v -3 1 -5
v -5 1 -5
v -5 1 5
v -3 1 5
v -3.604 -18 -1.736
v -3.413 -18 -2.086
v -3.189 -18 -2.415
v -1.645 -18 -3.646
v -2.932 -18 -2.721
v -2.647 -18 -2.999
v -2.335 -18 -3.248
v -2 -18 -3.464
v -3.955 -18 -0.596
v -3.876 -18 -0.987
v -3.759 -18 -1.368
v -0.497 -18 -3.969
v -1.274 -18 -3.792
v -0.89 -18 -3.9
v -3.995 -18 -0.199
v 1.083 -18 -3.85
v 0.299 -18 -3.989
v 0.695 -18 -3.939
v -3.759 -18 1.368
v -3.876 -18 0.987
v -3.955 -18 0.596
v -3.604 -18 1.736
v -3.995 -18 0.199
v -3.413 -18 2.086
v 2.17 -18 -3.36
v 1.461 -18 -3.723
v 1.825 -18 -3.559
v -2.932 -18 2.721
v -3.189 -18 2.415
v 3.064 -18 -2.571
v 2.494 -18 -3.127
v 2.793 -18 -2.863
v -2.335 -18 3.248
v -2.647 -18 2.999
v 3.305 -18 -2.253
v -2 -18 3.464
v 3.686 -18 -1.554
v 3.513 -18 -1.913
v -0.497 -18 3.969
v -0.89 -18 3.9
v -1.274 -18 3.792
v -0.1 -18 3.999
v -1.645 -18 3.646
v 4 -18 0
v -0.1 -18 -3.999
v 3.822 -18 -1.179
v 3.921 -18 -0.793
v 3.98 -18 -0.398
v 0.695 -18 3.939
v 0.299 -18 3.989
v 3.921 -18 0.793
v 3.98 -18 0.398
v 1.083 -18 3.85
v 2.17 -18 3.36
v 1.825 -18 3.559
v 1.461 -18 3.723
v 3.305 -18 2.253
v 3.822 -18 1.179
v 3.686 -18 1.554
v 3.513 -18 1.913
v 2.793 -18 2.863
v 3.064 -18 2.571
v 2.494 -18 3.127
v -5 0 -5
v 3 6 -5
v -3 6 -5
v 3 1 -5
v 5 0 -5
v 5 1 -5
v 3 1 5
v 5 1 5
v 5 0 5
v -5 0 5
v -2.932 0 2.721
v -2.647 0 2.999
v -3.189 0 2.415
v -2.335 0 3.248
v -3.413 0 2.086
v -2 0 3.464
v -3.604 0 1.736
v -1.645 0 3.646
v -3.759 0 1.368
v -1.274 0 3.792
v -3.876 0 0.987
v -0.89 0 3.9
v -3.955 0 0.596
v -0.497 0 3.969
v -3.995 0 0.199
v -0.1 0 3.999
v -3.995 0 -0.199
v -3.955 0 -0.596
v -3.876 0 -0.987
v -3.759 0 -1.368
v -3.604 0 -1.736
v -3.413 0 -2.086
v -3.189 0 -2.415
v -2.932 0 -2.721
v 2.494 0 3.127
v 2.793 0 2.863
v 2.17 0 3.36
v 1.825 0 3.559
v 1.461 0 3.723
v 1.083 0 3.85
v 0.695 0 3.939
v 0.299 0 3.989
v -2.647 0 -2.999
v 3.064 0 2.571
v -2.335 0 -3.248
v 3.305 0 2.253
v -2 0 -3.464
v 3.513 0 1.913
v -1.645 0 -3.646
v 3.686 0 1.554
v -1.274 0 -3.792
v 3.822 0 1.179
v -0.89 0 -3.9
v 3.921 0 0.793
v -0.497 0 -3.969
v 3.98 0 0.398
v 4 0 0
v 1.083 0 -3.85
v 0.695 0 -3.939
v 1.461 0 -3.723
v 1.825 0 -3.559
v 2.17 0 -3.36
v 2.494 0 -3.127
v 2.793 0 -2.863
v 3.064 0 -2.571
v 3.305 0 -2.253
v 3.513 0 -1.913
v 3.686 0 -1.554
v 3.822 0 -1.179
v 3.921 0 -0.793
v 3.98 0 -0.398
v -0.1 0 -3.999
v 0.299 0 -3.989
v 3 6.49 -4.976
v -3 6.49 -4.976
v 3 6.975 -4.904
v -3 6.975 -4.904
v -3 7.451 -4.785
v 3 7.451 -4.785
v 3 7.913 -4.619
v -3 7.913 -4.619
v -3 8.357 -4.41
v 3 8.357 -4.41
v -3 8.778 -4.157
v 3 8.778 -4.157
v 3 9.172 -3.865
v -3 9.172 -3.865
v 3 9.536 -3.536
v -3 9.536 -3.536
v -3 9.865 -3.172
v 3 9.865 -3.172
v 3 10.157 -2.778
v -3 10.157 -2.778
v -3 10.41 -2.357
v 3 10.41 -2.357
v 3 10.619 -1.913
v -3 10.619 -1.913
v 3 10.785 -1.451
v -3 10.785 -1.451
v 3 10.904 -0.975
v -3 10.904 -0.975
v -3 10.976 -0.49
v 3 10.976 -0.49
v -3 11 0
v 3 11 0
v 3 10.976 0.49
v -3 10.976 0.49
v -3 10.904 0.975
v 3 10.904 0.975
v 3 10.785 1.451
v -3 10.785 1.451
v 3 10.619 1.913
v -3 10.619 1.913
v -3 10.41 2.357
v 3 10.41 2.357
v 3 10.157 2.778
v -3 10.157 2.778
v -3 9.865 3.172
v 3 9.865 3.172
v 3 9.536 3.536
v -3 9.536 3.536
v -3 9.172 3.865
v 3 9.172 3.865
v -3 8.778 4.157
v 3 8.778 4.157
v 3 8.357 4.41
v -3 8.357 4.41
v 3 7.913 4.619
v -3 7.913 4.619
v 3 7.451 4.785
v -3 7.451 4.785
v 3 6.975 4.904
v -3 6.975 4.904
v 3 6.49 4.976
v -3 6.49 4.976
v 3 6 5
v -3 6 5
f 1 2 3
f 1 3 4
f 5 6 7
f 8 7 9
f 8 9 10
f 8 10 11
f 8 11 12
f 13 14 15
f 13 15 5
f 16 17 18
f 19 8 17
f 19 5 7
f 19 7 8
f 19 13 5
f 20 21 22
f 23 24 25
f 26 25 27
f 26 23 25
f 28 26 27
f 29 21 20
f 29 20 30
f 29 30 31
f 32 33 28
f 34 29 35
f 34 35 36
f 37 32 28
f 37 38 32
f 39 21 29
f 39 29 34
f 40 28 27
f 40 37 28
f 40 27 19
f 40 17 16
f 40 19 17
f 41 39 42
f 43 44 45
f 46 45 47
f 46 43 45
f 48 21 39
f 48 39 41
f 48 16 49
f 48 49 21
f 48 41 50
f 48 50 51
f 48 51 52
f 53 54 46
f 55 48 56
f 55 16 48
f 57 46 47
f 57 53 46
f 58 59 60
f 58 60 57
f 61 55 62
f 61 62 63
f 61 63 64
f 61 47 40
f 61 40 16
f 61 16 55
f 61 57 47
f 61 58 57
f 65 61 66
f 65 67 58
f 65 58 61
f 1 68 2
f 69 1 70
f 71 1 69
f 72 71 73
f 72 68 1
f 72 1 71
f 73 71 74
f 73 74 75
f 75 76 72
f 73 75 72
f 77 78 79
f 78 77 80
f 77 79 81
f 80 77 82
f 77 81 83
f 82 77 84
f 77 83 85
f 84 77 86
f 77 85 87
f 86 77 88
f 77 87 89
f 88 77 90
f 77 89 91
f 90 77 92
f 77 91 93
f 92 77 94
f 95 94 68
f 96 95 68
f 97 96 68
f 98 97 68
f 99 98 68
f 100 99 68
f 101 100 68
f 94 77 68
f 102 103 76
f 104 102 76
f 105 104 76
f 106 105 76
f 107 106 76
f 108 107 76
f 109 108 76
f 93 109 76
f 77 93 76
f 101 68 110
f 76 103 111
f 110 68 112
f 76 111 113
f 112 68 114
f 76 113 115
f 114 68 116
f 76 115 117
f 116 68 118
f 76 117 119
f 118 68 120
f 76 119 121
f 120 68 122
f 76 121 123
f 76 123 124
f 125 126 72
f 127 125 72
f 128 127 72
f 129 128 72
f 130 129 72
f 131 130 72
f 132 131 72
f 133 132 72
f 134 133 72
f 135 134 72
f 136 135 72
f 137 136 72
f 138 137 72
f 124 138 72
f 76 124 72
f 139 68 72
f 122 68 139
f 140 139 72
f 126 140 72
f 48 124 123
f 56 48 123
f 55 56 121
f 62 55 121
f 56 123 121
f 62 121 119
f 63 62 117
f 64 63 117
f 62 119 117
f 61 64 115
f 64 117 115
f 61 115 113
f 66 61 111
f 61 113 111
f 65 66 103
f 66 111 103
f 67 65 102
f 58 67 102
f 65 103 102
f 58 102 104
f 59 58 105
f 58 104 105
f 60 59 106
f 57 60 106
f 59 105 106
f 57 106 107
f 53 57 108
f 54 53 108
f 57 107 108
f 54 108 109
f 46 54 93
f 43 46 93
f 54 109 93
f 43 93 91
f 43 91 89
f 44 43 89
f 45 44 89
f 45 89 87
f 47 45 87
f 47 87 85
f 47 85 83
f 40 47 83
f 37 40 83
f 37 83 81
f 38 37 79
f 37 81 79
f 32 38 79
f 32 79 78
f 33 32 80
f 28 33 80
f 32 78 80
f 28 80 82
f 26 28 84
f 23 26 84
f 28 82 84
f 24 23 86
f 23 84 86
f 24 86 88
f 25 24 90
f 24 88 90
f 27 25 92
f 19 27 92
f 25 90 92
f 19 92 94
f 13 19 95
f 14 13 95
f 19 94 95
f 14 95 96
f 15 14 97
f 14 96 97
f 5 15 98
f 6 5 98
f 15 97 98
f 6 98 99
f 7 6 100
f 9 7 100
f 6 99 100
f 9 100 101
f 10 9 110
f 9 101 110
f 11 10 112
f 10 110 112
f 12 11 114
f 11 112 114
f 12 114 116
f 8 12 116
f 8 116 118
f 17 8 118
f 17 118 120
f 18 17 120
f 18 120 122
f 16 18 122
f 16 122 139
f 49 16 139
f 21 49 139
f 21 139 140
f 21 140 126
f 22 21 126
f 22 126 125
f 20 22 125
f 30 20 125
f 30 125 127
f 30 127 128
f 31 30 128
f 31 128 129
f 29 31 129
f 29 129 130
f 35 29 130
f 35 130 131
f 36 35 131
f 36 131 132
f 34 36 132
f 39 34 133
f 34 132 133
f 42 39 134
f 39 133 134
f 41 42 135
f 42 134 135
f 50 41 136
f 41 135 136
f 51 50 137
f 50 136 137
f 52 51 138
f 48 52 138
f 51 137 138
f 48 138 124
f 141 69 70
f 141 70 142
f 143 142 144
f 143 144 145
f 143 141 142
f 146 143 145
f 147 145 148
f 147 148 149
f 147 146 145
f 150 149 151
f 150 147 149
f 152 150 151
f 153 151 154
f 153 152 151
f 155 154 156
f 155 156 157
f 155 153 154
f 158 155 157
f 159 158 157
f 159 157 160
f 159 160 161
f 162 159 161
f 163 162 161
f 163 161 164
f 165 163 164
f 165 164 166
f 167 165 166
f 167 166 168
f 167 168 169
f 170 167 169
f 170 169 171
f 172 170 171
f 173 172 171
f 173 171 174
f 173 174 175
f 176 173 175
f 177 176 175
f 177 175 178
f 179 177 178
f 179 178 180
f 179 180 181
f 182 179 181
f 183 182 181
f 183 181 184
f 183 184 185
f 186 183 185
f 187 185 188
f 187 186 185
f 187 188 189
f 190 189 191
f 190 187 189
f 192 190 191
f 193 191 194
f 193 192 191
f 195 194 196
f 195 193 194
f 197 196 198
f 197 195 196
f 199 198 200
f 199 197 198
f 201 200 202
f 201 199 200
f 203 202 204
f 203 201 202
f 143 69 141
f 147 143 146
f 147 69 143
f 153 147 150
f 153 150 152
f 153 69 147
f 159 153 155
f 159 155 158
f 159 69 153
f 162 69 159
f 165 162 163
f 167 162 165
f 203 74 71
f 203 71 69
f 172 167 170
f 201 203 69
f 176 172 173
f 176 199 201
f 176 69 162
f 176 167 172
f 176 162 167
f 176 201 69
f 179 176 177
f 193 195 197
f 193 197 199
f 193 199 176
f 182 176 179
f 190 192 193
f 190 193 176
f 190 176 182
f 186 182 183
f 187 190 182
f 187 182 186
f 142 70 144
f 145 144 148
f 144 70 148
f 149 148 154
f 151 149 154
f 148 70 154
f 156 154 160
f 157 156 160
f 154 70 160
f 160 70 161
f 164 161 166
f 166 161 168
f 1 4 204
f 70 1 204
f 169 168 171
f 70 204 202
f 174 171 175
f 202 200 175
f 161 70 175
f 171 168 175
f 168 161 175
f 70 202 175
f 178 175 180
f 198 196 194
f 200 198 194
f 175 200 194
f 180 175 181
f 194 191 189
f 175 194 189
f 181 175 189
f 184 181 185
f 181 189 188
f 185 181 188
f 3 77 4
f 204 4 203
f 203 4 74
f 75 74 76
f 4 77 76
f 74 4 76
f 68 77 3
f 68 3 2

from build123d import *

# Parameters (mm, degrees)
SKETCH_1_W          = 10
SKETCH_1_H          = 10
EXTRUDE_1_DEPTH     = 11
SKETCH_2_R          = 4
EXTRUDE_2_DEPTH     = 18
SKETCH_3_W          = 2
SKETCH_3_H          = 10
CUT_EXTRUDE_1_DEPTH = 46
CUT_EXTRUDE_2_DEPTH = 46


with BuildPart() as part:
    # 草图1 → 凸台-拉伸1 (new body)
    with BuildSketch(Plane(origin=(0, 0, 0), x_dir=(1, 0, 0), z_dir=(0, 1, 0))):
        Rectangle(SKETCH_1_W, SKETCH_1_H)
    extrude(amount=EXTRUDE_1_DEPTH)

    # 草图2 → 凸台-拉伸2 (add)
    with BuildSketch(Plane.XZ):
        Circle(SKETCH_2_R)
    extrude(amount=EXTRUDE_2_DEPTH)

    # 草图3 → 切除-拉伸1 (cut)
    with BuildSketch(Plane.XY.offset(5)):
        with Locations((-4, 6)):
            Rectangle(SKETCH_3_W, SKETCH_3_H)
        with Locations((4, 6)):
            Rectangle(SKETCH_3_W, SKETCH_3_H)
    extrude(amount=-CUT_EXTRUDE_1_DEPTH, mode=Mode.SUBTRACT)

    # 草图4 → 切除-拉伸2 (cut)
    with BuildSketch(Plane(origin=(3, 0, 0), x_dir=(0, 0, -1), z_dir=(1, 0, 0))):
        with BuildLine():
            Line((-5, 6), (-5, 15.436246411))
            Line((-5, 15.436246411), (5, 15.436246411))
            Line((5, 15.436246411), (5, 6))
            ThreePointArc((5, 6), (0, 11), (-5, 6))
        make_face()
    extrude(amount=-CUT_EXTRUDE_2_DEPTH, mode=Mode.SUBTRACT)


solid = part.part
